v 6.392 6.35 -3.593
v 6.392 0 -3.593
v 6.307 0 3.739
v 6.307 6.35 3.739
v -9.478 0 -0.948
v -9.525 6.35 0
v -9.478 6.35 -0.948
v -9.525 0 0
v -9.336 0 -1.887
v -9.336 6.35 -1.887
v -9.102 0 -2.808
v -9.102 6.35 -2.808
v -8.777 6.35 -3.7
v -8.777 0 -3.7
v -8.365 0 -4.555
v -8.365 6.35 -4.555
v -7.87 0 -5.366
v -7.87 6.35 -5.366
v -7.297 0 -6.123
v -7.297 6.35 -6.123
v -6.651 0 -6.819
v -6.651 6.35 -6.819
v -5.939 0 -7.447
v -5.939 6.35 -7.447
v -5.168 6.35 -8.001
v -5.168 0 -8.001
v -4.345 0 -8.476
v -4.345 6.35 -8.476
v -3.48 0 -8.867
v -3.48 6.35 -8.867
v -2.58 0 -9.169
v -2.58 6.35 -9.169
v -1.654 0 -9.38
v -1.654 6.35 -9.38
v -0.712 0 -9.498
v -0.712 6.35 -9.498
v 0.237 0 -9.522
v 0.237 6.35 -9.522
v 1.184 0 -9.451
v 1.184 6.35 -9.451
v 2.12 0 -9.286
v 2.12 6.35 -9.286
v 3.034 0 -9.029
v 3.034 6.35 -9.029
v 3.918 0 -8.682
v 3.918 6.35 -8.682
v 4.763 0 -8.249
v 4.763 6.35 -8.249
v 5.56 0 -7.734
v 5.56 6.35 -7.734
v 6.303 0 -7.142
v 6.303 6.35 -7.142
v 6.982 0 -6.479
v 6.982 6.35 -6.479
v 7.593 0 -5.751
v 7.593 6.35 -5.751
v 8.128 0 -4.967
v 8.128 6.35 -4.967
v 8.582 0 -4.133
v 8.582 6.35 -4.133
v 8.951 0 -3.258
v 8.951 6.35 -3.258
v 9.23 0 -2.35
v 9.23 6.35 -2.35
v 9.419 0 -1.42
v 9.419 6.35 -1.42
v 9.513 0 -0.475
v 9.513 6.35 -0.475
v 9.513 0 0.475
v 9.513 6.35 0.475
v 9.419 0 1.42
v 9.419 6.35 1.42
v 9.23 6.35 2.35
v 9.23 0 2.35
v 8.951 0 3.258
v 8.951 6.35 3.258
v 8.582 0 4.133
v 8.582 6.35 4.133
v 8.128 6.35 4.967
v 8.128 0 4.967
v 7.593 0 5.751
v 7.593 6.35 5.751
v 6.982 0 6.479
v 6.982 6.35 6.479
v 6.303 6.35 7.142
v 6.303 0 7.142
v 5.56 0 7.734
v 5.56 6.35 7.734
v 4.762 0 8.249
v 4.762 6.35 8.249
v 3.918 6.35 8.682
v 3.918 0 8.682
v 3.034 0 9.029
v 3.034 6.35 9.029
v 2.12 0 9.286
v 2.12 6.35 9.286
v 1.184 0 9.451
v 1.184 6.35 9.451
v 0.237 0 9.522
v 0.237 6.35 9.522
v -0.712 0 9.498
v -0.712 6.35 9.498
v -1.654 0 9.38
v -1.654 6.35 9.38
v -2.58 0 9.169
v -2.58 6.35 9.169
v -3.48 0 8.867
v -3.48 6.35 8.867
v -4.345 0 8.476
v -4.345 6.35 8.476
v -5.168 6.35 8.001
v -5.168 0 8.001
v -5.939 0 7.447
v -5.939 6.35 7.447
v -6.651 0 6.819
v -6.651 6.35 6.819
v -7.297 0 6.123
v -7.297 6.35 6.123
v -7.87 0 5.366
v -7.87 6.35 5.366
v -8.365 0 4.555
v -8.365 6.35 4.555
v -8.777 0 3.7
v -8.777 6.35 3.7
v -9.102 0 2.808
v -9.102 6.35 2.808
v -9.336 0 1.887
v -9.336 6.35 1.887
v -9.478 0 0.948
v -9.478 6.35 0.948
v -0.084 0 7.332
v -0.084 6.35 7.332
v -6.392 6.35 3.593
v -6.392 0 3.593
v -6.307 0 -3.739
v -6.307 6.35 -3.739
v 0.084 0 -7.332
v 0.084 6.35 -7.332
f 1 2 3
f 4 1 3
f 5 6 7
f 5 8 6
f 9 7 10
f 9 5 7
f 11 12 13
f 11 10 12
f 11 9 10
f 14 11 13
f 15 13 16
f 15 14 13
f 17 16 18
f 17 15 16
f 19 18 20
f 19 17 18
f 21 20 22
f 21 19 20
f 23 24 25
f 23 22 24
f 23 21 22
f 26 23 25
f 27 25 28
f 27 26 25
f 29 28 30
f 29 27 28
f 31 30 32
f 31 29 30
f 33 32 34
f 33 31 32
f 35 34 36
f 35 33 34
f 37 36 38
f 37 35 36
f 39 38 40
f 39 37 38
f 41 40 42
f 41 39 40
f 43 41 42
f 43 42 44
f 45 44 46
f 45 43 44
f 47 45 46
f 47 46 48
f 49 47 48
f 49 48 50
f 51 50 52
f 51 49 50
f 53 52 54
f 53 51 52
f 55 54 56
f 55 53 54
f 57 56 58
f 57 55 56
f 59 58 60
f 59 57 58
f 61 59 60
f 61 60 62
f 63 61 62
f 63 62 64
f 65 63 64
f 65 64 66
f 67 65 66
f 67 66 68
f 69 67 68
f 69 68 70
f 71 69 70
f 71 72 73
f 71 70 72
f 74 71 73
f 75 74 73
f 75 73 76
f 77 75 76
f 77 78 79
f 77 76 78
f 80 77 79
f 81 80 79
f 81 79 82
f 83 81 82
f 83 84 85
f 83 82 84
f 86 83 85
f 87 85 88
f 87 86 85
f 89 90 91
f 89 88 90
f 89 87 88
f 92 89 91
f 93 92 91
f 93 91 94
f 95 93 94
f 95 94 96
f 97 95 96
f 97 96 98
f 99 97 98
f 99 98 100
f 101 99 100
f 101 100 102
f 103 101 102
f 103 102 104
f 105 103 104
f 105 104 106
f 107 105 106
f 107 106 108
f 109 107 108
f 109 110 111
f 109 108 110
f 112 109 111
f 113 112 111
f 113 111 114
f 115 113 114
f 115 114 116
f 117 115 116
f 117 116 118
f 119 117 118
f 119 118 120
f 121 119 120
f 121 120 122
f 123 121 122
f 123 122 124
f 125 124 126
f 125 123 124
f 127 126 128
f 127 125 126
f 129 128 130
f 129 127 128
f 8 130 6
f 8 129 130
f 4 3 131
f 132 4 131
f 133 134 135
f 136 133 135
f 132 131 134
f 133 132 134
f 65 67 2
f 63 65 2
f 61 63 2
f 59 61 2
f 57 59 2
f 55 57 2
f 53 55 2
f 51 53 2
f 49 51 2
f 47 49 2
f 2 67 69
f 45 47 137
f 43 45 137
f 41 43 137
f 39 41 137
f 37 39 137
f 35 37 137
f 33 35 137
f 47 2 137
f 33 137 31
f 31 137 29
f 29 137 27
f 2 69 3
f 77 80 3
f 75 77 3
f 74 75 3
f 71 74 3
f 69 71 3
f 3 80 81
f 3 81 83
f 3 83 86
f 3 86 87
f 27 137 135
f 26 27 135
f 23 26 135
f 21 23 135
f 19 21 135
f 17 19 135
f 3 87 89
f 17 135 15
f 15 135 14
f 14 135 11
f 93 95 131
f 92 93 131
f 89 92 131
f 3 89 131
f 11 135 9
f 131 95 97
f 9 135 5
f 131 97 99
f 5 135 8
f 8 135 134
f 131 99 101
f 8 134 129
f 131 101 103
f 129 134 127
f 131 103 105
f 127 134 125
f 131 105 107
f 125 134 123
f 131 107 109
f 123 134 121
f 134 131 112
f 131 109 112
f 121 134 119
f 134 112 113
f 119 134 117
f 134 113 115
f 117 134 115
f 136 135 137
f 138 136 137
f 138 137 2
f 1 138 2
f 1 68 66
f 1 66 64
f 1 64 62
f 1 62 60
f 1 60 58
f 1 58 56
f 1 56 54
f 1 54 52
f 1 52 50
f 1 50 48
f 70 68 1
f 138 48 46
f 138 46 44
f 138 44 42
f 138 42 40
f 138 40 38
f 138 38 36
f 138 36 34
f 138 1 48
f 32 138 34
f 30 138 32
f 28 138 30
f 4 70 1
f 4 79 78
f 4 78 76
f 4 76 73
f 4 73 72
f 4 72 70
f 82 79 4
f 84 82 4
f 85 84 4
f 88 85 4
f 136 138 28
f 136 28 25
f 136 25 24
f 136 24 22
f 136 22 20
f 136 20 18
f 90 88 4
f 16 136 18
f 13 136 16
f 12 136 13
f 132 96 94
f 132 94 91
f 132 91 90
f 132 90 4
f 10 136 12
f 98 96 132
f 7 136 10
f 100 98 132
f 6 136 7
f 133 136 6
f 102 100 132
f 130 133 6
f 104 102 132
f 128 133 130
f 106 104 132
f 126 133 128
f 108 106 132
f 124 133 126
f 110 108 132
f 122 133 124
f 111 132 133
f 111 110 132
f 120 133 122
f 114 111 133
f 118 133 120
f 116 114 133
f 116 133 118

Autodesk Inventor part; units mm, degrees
ref_plane "YZ Plane" through (0, 0, 0) normal (1, 0, 0) x (0, 1, 0)
ref_plane "XZ Plane" through (0, 0, 0) normal (0, 1, 0) x (-1, 0, 0)
ref_plane "XY Plane" through (0, 0, 0) normal (0, 0, 1) x (1, 0, 0)
sketch "Sketch1" plane through (0, 0, 0) normal (0, 1, 0) x (-1, 0, 0)
  circle A0 centre (0, 0) radius 9.525
  line L0 (6.3918, 3.5928) -> (6.3073, -3.7391)
  line L1 (6.3073, -3.7391) -> (-0.0845, -7.3319)
  line L2 (-0.0845, -7.3319) -> (-6.3918, -3.5928)
  line L3 (-6.3918, -3.5928) -> (-6.3073, 3.7391)
  line L4 (-6.3073, 3.7391) -> (0.0845, 7.3319)
  line L5 (0.0845, 7.3319) -> (6.3918, 3.5928)
  point P0 (6.3496, -0.0731)
  dimension "d0" = 19.05
  dimension "d1" = 12.7
extrude "Extrusion1" add sketch "Sketch1" along normal blind 6.35
properties part number "spacer"
